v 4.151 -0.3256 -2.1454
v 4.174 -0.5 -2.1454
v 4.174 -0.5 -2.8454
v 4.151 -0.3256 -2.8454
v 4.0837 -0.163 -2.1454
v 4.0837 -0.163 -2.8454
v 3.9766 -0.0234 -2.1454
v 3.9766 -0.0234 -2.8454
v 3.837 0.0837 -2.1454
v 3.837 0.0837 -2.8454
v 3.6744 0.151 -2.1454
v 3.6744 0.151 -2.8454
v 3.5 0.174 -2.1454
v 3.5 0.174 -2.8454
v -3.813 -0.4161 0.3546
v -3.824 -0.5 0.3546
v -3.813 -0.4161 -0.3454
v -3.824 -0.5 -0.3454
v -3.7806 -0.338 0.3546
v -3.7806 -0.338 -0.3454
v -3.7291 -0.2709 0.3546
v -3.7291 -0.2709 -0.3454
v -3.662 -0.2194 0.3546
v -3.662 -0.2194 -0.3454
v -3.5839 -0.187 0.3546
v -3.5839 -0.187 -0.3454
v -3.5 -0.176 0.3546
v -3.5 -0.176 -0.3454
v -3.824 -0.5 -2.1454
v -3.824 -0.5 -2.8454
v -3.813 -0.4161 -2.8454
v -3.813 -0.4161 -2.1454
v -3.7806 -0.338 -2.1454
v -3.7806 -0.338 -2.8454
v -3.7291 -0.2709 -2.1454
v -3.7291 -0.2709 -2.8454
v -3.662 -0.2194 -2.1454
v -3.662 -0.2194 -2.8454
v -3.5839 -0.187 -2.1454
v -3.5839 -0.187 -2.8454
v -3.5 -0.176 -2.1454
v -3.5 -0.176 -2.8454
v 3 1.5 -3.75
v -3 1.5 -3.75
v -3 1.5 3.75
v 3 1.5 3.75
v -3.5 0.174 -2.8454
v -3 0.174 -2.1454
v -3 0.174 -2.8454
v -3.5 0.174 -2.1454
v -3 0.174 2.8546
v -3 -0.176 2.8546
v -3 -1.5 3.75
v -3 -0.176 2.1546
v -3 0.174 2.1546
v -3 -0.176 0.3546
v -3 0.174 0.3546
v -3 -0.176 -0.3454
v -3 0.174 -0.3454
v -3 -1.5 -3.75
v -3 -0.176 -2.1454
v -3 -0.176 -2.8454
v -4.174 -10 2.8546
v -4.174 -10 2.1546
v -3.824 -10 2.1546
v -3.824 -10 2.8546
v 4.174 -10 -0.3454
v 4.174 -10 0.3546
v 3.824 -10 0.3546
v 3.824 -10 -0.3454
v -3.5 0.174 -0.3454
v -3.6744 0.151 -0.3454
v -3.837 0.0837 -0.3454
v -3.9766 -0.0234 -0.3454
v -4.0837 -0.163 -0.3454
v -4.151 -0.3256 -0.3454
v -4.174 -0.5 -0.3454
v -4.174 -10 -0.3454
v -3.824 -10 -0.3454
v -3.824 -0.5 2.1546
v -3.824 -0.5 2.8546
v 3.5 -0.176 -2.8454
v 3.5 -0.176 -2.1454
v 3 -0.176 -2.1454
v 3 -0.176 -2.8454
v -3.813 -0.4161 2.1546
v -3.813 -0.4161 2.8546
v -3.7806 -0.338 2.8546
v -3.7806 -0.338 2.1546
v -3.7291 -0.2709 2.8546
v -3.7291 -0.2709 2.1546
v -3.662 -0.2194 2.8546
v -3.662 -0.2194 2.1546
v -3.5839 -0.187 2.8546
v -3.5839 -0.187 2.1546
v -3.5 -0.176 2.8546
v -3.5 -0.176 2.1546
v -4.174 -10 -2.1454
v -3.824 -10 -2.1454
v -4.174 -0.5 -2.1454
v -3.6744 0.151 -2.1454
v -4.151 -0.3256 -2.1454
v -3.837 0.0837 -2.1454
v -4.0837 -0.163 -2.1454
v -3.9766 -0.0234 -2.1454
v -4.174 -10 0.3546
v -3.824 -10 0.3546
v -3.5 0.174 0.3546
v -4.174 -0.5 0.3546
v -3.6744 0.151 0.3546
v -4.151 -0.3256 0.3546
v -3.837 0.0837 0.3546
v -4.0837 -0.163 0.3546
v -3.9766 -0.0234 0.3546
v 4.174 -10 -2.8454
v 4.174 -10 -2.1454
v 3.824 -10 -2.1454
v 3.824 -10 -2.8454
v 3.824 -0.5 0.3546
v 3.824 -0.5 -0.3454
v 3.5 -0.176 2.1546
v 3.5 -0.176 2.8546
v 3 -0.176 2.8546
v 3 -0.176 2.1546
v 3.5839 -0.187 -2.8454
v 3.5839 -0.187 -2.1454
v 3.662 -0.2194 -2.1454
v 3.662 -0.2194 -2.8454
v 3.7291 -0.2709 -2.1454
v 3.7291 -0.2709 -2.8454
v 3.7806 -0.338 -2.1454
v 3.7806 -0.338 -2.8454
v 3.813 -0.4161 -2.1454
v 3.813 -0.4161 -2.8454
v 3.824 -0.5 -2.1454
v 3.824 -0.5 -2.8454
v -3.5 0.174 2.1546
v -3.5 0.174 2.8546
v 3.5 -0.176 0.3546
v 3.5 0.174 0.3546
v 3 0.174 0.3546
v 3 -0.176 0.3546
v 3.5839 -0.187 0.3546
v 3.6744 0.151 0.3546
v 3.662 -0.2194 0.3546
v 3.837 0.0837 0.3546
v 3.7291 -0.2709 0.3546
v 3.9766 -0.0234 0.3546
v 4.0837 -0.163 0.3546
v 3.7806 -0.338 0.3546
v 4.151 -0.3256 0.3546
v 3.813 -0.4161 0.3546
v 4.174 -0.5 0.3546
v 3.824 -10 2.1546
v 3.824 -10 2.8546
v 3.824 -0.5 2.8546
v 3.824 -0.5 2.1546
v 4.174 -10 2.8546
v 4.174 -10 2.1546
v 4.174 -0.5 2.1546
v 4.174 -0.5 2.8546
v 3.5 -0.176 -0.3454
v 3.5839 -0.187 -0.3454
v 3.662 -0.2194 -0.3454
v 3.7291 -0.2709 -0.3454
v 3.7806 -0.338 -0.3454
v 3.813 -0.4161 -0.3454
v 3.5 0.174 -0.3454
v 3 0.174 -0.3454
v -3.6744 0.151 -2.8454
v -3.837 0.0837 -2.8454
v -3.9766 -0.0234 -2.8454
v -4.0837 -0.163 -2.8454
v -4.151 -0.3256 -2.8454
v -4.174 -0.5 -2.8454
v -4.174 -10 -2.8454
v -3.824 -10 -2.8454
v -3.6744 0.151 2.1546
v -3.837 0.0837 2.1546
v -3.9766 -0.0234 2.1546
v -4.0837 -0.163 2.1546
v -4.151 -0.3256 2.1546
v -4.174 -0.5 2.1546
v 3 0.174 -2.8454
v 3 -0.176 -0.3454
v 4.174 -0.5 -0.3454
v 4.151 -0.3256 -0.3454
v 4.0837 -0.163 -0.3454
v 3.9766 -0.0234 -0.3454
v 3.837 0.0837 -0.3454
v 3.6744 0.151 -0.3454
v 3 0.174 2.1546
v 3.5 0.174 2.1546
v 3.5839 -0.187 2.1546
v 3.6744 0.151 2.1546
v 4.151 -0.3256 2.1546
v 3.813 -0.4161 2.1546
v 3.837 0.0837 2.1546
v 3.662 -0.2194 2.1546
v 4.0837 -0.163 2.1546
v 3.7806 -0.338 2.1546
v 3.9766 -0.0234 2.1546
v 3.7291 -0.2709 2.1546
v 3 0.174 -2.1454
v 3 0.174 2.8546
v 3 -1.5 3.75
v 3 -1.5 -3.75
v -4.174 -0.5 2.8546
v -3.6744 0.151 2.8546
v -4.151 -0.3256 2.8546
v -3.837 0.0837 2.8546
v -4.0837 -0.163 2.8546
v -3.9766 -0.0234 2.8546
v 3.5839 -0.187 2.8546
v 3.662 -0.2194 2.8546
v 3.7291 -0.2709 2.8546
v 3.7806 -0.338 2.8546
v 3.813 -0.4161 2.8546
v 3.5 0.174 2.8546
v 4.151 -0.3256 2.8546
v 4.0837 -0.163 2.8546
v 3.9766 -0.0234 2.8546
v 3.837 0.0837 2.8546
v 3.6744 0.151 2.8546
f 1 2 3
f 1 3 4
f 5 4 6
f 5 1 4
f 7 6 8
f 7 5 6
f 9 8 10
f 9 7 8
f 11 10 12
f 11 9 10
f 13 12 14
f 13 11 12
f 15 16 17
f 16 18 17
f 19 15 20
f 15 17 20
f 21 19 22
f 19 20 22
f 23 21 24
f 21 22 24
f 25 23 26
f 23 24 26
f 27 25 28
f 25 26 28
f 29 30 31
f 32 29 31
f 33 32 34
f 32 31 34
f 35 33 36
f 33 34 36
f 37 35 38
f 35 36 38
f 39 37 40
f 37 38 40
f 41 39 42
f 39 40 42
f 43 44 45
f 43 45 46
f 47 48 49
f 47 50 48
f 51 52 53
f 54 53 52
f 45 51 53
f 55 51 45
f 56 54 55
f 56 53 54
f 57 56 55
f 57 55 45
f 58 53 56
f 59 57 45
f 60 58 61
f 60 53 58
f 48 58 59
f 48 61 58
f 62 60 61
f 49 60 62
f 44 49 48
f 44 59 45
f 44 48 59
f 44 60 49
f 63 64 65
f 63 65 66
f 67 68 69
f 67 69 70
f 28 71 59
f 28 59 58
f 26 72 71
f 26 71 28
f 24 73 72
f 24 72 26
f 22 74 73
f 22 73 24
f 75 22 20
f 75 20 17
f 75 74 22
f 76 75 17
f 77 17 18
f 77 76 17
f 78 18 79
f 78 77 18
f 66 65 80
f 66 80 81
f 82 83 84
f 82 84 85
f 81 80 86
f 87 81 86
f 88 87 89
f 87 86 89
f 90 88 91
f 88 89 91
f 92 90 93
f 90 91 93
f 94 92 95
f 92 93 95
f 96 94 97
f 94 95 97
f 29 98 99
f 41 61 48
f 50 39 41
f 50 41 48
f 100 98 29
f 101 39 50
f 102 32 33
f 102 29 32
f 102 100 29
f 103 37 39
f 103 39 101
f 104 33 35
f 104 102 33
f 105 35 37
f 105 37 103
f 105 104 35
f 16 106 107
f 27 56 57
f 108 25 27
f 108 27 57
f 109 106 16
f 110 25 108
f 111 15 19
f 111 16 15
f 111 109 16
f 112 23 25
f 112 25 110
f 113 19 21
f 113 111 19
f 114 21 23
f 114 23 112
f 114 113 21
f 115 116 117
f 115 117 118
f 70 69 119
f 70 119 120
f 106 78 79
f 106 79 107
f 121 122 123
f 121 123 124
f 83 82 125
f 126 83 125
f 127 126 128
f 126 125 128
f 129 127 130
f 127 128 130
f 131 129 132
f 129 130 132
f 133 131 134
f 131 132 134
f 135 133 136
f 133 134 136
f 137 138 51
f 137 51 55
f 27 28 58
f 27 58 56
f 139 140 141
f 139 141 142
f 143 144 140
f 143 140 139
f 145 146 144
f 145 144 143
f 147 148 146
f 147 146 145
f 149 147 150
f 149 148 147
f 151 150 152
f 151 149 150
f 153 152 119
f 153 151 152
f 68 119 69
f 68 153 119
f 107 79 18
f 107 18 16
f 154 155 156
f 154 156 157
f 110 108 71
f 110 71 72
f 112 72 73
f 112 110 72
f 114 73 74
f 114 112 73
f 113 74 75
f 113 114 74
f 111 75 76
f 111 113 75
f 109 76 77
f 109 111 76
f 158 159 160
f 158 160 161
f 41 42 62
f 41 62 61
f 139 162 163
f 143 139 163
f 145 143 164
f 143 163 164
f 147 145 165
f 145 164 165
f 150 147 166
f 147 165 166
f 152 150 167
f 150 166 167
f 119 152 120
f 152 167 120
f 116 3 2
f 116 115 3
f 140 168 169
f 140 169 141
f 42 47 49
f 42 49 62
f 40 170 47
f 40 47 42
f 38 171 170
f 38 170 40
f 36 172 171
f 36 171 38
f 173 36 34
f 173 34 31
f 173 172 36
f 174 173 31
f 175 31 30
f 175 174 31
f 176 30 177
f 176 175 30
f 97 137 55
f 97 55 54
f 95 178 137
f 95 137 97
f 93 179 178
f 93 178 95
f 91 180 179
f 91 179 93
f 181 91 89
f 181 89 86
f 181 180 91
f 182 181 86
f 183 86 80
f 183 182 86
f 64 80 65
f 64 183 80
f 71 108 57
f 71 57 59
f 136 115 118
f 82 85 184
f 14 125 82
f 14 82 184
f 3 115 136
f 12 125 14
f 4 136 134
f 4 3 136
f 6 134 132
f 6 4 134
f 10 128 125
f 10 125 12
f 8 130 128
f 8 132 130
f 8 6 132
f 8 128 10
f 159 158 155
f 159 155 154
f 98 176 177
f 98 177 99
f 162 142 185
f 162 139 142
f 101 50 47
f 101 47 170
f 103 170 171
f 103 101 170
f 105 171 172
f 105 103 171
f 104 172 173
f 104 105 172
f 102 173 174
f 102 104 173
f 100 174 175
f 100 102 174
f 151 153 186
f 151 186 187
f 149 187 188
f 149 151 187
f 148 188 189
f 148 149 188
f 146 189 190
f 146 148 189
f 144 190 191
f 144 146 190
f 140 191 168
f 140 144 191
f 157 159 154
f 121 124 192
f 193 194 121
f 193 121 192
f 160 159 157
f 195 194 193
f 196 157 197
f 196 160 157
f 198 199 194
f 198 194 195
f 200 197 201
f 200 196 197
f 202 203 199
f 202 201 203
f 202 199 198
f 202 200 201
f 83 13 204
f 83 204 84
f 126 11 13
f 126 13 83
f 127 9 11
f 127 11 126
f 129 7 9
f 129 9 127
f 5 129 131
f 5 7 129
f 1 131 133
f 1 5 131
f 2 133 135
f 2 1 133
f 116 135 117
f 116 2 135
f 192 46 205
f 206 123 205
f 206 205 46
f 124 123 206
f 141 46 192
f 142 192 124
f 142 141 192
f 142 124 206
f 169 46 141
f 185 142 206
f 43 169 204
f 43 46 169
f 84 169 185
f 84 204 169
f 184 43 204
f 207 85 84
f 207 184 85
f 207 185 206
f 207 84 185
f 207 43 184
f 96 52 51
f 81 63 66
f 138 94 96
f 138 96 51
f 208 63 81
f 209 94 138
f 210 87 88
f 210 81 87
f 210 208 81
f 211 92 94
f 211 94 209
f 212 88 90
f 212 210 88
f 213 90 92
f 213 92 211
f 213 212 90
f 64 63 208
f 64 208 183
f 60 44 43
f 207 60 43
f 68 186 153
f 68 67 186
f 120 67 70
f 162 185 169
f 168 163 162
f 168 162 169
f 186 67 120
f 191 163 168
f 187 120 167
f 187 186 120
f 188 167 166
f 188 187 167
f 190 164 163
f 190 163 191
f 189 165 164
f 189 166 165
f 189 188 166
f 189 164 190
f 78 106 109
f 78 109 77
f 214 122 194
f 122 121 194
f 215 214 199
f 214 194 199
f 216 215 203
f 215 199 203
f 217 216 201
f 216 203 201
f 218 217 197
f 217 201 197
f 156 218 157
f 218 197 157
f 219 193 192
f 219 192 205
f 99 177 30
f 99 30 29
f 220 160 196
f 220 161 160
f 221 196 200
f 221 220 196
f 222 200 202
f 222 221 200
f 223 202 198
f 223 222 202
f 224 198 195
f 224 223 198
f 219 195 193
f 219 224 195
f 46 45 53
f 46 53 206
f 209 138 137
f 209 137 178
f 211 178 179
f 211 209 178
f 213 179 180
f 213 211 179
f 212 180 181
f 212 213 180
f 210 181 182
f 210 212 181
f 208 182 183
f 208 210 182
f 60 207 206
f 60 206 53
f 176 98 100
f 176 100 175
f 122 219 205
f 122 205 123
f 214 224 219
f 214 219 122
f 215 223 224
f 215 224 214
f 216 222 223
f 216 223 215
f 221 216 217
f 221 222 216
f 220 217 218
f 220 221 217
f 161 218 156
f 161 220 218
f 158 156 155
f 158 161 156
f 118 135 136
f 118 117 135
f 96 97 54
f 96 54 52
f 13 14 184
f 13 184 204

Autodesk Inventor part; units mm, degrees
ref_plane "YZ Plane" through (0, 0, 0) normal (1, 0, 0) x (0, 1, 0)
ref_plane "XZ Plane" through (0, 0, 0) normal (0, 1, 0) x (-1, 0, 0)
ref_plane "XY Plane" through (0, 0, 0) normal (0, 0, 1) x (1, 0, 0)
sketch "Sketch2" plane through (0, 0, 0) normal (0, 0, 1) x (1, 0, 0)
  line L0 (3, -1.5) -> (-3, -1.5)
  line L1 (-3, -1.5) -> (-3, 1.5)
  line L2 (-3, 1.5) -> (3, 1.5)
  line L3 (3, 1.5) -> (3, -1.5)
  line L4 (3, -1.5) -> (-3, 1.5) construction
  line L5 (-3, -1.5) -> (3, 1.5) construction
  point P0 (0, 0)
  dimension "d4" = 6
  dimension "d5" = 3
extrude "Extrusion1" add sketch "Sketch2" along normal mid plane 7.5
ref_plane "Work Plane1" through (3, -1.5, 3.75) normal (1, 0, 0) x (0, 0, -1)
ref_plane "Work Plane4" through (0, 0, 2.5) normal (0, 0, 1) x (1, 0, 0)
ref_plane "Work Plane5" through (-3, -10, 3.75) normal (0, -1, 0) x (1, 0, 0)
sketch "Sketch25" plane through (0, 0, 2.5) normal (0, 0, 1) x (1, 0, 0)
  line L0 (3, -1.5) -> (3, 1.5) projected
  line L1 (3, 0) -> (3.5, 0)
  line L2 (4, -0.5) -> (4, -10)
  arc A0 (4, -0.5) -> (3.5, 0) centre (3.5, -0.5) ccw
  point P0 (0, 0)
  point P1 (4, 0)
  dimension "d44" = 1
  dimension "d45" = 10
  dimension "d46" = 0.5
sketch "Sketch26" plane through (-3, -10, 3.75) normal (0, -1, 0) x (1, 0, 0)
  line L0 (6.824, -0.8954) -> (7.174, -0.8954)
  line L1 (7.174, -0.8954) -> (7.174, -1.5954)
  line L2 (7.174, -1.5954) -> (6.824, -1.5954)
  line L3 (6.824, -1.5954) -> (6.824, -0.8954)
  line L4 (6.824, -0.8954) -> (7.174, -1.5954) construction
  line L5 (7.174, -0.8954) -> (6.824, -1.5954) construction
  point P0 (3, -3.75)
  point P1 (6.999, -1.2454)
  dimension "d37" = 0.35
  dimension "d38" = 0.7
sweep "Sweep2" add profiles "Sketch26" path "Sketch25" path curves L2 A0 L1
pattern_linear "Rectangular Pattern2" count 3 spacing 2.5 along (0, 0, -1) of "Sweep2"
mirror "Mirror2" about plane through (0, 0, 0) normal (1, 0, 0) of "Sweep2", "Rectangular Pattern2"
properties part number "DetalV2(legs)"
